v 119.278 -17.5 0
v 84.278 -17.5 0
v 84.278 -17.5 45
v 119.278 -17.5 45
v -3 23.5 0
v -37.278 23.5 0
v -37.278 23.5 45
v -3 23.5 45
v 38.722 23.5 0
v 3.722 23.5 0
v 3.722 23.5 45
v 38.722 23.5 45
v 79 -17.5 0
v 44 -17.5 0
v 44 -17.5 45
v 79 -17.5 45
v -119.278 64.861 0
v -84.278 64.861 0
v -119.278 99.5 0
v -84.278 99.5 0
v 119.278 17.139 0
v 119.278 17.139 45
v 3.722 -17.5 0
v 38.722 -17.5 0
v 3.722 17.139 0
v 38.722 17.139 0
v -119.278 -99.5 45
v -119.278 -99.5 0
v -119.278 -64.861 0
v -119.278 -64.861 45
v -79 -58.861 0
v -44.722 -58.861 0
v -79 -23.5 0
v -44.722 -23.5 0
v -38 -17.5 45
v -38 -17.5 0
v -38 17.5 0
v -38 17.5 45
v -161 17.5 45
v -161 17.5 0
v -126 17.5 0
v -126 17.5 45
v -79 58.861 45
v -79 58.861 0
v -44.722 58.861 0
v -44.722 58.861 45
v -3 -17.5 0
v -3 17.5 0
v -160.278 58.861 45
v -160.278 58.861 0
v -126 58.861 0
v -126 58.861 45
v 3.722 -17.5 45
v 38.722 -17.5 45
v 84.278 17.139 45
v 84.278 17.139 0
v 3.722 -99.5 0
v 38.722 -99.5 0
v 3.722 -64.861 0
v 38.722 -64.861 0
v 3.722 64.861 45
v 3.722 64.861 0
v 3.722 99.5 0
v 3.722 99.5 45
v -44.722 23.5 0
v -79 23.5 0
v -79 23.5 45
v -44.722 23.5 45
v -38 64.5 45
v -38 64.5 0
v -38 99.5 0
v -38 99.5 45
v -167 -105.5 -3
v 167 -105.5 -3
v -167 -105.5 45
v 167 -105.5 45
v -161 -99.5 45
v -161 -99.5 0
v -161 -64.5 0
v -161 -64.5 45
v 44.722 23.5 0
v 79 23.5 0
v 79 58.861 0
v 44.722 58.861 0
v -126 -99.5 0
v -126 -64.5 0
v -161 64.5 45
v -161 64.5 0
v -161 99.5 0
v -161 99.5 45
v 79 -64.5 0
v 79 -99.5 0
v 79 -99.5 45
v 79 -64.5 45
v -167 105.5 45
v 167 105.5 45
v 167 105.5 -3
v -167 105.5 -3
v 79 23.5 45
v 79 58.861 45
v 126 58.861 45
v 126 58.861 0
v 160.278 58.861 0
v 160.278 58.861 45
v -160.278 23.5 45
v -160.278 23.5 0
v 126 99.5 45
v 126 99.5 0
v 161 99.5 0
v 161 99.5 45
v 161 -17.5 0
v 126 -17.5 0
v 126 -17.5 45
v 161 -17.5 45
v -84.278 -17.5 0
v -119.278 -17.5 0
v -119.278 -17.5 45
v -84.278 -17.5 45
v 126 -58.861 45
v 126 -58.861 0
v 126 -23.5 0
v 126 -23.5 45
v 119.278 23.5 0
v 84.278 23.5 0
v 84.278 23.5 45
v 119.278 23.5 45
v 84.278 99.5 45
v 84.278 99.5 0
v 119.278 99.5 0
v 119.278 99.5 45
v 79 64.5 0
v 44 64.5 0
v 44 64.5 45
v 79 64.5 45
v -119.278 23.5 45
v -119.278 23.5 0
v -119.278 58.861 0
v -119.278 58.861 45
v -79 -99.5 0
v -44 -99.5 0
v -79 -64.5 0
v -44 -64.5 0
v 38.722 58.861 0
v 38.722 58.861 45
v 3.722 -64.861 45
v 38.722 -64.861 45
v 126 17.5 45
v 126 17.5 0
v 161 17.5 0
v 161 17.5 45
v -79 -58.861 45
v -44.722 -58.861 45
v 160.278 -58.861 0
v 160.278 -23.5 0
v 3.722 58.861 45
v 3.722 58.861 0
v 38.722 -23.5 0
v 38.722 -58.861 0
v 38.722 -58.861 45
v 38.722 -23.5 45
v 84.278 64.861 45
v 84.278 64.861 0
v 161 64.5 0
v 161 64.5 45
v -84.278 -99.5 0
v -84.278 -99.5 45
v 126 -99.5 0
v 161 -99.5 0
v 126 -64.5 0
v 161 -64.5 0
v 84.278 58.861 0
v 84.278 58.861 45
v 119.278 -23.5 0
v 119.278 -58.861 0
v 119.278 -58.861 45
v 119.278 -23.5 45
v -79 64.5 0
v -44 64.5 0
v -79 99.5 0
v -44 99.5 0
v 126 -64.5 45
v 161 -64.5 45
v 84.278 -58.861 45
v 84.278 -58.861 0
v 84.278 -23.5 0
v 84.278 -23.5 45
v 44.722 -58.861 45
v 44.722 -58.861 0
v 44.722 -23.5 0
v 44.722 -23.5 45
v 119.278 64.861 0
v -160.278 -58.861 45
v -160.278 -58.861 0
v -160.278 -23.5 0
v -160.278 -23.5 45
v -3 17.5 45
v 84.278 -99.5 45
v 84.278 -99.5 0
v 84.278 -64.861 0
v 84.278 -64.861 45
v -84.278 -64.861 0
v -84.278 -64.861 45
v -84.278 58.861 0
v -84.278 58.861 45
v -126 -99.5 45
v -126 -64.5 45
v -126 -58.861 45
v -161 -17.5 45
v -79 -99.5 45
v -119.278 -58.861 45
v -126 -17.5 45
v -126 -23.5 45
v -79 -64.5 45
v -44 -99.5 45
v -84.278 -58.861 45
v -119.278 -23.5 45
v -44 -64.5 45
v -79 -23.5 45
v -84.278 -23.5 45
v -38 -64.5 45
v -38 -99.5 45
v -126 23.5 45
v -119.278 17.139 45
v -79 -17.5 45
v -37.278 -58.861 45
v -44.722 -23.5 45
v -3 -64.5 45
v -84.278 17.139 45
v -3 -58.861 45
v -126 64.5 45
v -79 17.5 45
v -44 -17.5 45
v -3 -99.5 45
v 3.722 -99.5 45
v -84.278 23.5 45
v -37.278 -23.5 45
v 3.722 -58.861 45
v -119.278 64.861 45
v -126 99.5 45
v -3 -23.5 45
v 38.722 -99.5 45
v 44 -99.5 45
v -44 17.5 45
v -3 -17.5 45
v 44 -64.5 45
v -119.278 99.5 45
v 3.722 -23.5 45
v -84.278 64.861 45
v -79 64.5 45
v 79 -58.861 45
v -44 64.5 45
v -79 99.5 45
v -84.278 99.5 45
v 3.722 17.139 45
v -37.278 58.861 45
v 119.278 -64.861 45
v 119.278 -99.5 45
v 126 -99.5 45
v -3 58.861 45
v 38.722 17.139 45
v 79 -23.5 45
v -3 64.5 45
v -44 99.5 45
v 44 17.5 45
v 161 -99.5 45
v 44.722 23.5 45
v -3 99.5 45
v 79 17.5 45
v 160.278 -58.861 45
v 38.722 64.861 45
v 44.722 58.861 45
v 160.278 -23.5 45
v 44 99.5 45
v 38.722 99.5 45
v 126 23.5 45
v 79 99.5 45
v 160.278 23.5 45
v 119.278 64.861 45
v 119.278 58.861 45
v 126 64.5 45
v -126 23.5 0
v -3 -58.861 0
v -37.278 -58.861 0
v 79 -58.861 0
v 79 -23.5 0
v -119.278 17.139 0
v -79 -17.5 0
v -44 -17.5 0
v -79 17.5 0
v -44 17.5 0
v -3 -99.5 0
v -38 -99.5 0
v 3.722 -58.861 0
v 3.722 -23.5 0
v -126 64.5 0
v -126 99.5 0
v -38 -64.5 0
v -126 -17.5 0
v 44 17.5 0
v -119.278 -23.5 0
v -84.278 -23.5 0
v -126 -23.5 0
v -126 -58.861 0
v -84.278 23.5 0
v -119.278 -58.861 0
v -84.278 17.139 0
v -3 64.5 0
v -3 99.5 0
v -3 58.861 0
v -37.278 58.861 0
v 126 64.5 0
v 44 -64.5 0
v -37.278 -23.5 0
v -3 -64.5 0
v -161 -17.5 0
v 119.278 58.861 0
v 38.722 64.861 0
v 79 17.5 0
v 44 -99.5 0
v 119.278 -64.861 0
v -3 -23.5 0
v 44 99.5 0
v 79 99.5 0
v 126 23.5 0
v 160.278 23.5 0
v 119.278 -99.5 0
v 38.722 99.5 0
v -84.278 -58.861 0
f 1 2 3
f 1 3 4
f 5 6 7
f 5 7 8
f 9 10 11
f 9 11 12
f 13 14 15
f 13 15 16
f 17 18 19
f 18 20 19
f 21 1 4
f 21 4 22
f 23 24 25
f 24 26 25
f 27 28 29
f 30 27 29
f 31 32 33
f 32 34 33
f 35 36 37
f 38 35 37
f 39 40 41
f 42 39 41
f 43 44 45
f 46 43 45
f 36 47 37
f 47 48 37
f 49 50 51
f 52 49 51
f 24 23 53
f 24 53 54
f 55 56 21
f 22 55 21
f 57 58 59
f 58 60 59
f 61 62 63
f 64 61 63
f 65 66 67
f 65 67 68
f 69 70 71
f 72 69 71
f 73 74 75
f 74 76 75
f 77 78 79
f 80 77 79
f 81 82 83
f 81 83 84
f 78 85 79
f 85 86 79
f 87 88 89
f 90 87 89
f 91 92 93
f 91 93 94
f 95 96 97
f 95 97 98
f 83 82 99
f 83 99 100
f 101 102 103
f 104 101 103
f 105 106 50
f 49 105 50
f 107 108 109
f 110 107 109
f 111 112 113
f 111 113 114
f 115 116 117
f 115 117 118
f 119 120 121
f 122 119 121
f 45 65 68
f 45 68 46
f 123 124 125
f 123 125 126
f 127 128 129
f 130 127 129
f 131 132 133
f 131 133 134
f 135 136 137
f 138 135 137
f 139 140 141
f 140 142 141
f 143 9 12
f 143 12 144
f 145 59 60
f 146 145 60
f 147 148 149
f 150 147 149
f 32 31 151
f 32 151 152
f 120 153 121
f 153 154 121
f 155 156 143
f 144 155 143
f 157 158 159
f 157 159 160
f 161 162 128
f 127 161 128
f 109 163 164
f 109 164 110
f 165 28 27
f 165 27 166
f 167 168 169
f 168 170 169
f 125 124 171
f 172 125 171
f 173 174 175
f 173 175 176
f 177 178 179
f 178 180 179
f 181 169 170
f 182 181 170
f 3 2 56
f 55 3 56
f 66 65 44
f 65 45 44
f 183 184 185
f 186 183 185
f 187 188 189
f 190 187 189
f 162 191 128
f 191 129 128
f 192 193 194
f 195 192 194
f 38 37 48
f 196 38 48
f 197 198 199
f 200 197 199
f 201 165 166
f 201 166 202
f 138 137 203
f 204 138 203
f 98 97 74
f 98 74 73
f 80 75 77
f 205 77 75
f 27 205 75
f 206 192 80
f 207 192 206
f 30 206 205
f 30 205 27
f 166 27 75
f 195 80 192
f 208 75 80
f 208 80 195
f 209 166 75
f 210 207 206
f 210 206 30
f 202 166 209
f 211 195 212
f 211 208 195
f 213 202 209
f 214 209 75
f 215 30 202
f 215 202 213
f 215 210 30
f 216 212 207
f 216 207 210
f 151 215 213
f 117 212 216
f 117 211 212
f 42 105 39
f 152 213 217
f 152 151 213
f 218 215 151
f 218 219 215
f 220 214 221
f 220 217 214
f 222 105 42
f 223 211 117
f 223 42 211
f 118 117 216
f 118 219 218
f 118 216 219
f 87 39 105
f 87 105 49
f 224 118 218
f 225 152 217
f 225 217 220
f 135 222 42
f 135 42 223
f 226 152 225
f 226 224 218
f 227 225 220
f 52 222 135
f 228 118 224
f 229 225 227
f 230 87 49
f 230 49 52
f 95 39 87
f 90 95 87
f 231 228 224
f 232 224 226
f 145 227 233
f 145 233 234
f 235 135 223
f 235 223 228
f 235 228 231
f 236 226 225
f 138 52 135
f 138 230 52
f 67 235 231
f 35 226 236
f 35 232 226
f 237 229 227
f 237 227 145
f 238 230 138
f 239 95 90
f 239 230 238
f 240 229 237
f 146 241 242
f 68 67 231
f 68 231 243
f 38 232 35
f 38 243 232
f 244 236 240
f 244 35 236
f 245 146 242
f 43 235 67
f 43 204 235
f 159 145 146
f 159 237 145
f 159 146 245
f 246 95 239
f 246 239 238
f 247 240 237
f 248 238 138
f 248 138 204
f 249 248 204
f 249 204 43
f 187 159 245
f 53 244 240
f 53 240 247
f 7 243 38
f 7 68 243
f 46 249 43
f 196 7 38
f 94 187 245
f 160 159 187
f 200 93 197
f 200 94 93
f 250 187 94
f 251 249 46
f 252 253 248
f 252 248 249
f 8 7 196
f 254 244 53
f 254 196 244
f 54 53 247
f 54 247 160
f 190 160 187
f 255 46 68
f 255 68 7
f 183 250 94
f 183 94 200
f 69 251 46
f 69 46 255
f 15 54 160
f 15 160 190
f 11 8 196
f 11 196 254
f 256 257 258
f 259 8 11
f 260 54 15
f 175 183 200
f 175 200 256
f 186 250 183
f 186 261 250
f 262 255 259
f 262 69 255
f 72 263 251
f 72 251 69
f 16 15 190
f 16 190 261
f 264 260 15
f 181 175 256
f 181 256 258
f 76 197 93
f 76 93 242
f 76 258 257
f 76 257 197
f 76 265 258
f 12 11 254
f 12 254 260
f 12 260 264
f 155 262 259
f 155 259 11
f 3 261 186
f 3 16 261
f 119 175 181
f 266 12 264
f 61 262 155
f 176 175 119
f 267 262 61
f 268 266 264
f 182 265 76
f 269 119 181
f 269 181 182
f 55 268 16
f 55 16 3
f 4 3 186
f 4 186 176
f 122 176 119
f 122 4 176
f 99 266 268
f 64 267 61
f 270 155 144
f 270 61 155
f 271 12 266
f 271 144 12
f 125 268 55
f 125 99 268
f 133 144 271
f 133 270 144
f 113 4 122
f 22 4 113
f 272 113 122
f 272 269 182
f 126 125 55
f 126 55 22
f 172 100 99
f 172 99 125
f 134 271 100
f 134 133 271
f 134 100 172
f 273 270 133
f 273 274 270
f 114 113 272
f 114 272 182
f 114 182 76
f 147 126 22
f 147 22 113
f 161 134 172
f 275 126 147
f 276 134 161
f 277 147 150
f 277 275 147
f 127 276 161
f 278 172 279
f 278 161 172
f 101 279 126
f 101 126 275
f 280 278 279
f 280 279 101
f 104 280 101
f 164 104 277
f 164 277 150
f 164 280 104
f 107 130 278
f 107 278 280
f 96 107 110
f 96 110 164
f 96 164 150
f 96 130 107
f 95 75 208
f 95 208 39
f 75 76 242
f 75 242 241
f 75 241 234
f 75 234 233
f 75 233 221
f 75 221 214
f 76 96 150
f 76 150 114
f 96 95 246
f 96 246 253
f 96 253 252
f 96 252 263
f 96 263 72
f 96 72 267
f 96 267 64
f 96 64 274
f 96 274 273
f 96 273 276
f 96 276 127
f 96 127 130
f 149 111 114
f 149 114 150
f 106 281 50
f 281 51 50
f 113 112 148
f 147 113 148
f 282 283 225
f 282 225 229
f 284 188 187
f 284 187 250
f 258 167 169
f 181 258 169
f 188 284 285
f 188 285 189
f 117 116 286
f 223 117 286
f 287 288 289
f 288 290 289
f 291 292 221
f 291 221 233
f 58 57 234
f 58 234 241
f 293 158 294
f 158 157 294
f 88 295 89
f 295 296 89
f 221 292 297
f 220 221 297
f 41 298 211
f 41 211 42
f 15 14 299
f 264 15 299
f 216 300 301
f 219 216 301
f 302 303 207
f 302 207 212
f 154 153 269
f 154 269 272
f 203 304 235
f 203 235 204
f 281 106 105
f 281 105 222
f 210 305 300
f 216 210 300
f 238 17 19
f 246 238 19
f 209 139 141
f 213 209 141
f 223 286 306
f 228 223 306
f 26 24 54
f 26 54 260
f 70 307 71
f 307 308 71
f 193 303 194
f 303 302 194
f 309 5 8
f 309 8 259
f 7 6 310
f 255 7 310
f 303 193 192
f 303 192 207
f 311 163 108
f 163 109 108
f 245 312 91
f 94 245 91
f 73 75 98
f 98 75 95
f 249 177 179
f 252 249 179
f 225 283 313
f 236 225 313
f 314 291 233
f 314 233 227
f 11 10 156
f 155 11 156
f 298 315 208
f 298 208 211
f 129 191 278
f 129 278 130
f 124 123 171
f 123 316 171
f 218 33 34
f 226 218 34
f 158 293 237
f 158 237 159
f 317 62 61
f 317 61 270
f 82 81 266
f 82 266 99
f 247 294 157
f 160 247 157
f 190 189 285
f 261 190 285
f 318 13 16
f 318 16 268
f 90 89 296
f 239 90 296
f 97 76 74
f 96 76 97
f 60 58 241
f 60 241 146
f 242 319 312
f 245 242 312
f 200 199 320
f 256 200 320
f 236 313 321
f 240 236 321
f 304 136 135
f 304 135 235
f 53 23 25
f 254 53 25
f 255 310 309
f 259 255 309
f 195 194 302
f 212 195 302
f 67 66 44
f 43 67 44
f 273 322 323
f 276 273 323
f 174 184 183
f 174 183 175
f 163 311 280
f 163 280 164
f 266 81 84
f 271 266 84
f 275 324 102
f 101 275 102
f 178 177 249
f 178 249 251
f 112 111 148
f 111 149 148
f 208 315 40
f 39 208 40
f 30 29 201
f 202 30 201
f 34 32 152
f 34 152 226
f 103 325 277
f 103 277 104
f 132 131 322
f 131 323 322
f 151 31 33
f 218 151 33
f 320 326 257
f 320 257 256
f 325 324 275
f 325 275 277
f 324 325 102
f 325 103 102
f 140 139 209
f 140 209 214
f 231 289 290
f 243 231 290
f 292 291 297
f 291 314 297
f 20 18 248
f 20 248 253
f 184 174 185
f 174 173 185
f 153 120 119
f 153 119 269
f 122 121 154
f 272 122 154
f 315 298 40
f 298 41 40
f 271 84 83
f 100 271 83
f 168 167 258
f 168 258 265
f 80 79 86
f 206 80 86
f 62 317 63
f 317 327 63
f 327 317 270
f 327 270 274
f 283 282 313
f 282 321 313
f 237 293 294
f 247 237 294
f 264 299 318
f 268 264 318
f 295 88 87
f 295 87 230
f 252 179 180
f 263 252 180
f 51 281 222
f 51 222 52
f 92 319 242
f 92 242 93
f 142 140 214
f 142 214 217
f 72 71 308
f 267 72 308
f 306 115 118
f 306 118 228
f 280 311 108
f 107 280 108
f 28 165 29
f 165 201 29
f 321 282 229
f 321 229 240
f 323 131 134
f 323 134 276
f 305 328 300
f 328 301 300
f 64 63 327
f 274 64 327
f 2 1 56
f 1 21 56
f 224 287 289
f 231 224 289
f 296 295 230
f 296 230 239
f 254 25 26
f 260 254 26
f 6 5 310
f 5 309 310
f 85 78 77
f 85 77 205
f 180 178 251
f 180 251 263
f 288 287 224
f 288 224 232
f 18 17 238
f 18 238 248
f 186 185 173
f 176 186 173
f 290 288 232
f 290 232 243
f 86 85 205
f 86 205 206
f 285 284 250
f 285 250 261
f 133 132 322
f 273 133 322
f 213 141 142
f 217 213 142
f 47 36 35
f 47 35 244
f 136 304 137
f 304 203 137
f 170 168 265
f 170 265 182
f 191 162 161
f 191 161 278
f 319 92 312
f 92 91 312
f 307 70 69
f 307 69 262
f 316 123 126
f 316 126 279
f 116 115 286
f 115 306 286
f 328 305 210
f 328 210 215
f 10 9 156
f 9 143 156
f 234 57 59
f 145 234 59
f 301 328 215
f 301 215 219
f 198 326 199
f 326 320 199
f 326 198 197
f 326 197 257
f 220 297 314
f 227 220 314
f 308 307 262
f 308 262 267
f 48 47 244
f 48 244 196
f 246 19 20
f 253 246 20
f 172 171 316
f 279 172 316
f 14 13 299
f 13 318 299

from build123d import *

# Parameters (mm, degrees)
SKETCH1_W           = 334
SKETCH1_H           = 211
SKETCH1_W_2         = 34.277630703
SKETCH1_H_2         = 35.361184648
SKETCH1_W_3         = 35
SKETCH1_H_3         = 35
SKETCH1_H_4         = 34.638815352
BOSS_EXTRUDE1_DEPTH = 45
SKETCH2_W           = 334
SKETCH2_H           = 211
BOSS_EXTRUDE2_DEPTH = 3


with BuildPart() as part:
    # Sketch1 → Boss-Extrude1 (new body)
    with BuildSketch(Plane.XY):
        Rectangle(SKETCH1_W, SKETCH1_H)
        with Locations((143.138815351, 41.180592324)):
            Rectangle(SKETCH1_W_2, SKETCH1_H_2, mode=Mode.SUBTRACT)
        with Locations((143.5, 82)):
            Rectangle(SKETCH1_W_3, SKETCH1_H_3, mode=Mode.SUBTRACT)
        with Locations((61.5, 82)):
            Rectangle(SKETCH1_W_3, SKETCH1_H_3, mode=Mode.SUBTRACT)
        with Locations((61.861184649, 41.180592324)):
            Rectangle(SKETCH1_W_2, SKETCH1_H_2, mode=Mode.SUBTRACT)
        with Locations((101.777630703, 82.180592324)):
            Rectangle(SKETCH1_W_3, SKETCH1_H_4, mode=Mode.SUBTRACT)
        with Locations((101.777630703, 41.180592324)):
            Rectangle(SKETCH1_W_3, SKETCH1_H_2, mode=Mode.SUBTRACT)
        with Locations((143.138815351, -41.180592324)):
            Rectangle(SKETCH1_W_2, SKETCH1_H_2, mode=Mode.SUBTRACT)
        with Locations((101.777630703, -41.180592324)):
            Rectangle(SKETCH1_W_3, SKETCH1_H_2, mode=Mode.SUBTRACT)
        with Locations((61.861184649, -41.180592324)):
            Rectangle(SKETCH1_W_2, SKETCH1_H_2, mode=Mode.SUBTRACT)
        with Locations((61.5, -82)):
            Rectangle(SKETCH1_W_3, SKETCH1_H_3, mode=Mode.SUBTRACT)
        with Locations((101.777630703, -82.180592324)):
            Rectangle(SKETCH1_W_3, SKETCH1_H_4, mode=Mode.SUBTRACT)
        with Locations((143.5, -82)):
            Rectangle(SKETCH1_W_3, SKETCH1_H_3, mode=Mode.SUBTRACT)
        with Locations((-143.5, -82)):
            Rectangle(SKETCH1_W_3, SKETCH1_H_3, mode=Mode.SUBTRACT)
        with Locations((-101.777630703, -82.180592324)):
            Rectangle(SKETCH1_W_3, SKETCH1_H_4, mode=Mode.SUBTRACT)
        with Locations((-61.5, -82)):
            Rectangle(SKETCH1_W_3, SKETCH1_H_3, mode=Mode.SUBTRACT)
        with Locations((-61.861184649, -41.180592324)):
            Rectangle(SKETCH1_W_2, SKETCH1_H_2, mode=Mode.SUBTRACT)
        with Locations((-101.777630703, -41.180592324)):
            Rectangle(SKETCH1_W_3, SKETCH1_H_2, mode=Mode.SUBTRACT)
        with Locations((-143.138815351, -41.180592324)):
            Rectangle(SKETCH1_W_2, SKETCH1_H_2, mode=Mode.SUBTRACT)
        with Locations((-143.138815351, 41.180592324)):
            Rectangle(SKETCH1_W_2, SKETCH1_H_2, mode=Mode.SUBTRACT)
        with Locations((-101.777630703, 41.180592324)):
            Rectangle(SKETCH1_W_3, SKETCH1_H_2, mode=Mode.SUBTRACT)
        with Locations((-61.861184649, 41.180592324)):
            Rectangle(SKETCH1_W_2, SKETCH1_H_2, mode=Mode.SUBTRACT)
        with Locations((-61.5, 82)):
            Rectangle(SKETCH1_W_3, SKETCH1_H_3, mode=Mode.SUBTRACT)
        with Locations((-101.777630703, 82.180592324)):
            Rectangle(SKETCH1_W_3, SKETCH1_H_4, mode=Mode.SUBTRACT)
        with Locations((-143.5, 82)):
            Rectangle(SKETCH1_W_3, SKETCH1_H_3, mode=Mode.SUBTRACT)
        with Locations((61.5, 0)):
            Rectangle(SKETCH1_W_3, SKETCH1_H_3, mode=Mode.SUBTRACT)
        with Locations((101.777630703, -0.180592324)):
            Rectangle(SKETCH1_W_3, SKETCH1_H_4, mode=Mode.SUBTRACT)
        with Locations((143.5, 0)):
            Rectangle(SKETCH1_W_3, SKETCH1_H_3, mode=Mode.SUBTRACT)
        with Locations((-143.5, 0)):
            Rectangle(SKETCH1_W_3, SKETCH1_H_3, mode=Mode.SUBTRACT)
        with Locations((-101.777630703, -0.180592324)):
            Rectangle(SKETCH1_W_3, SKETCH1_H_4, mode=Mode.SUBTRACT)
        with Locations((-61.5, 0)):
            Rectangle(SKETCH1_W_3, SKETCH1_H_3, mode=Mode.SUBTRACT)
        with Locations((-20.5, 82)):
            Rectangle(SKETCH1_W_3, SKETCH1_H_3, mode=Mode.SUBTRACT)
        with Locations((-20.138815351, 41.180592324)):
            Rectangle(SKETCH1_W_2, SKETCH1_H_2, mode=Mode.SUBTRACT)
        with Locations((-20.5, 0)):
            Rectangle(SKETCH1_W_3, SKETCH1_H_3, mode=Mode.SUBTRACT)
        with Locations((-20.138815351, -41.180592324)):
            Rectangle(SKETCH1_W_2, SKETCH1_H_2, mode=Mode.SUBTRACT)
        with Locations((-20.5, -82)):
            Rectangle(SKETCH1_W_3, SKETCH1_H_3, mode=Mode.SUBTRACT)
        with Locations((21.222369297, -82.180592324)):
            Rectangle(SKETCH1_W_3, SKETCH1_H_4, mode=Mode.SUBTRACT)
        with Locations((21.222369297, -41.180592324)):
            Rectangle(SKETCH1_W_3, SKETCH1_H_2, mode=Mode.SUBTRACT)
        with Locations((21.222369297, -0.180592324)):
            Rectangle(SKETCH1_W_3, SKETCH1_H_4, mode=Mode.SUBTRACT)
        with Locations((21.222369297, 41.180592324)):
            Rectangle(SKETCH1_W_3, SKETCH1_H_2, mode=Mode.SUBTRACT)
        with Locations((21.222369297, 82.180592324)):
            Rectangle(SKETCH1_W_3, SKETCH1_H_4, mode=Mode.SUBTRACT)
    extrude(amount=BOSS_EXTRUDE1_DEPTH)

    # Sketch2 → Boss-Extrude2 (add)
    with BuildSketch(Plane(origin=(0, 0, 0), x_dir=(-1, 0, 0), z_dir=(0, 0, -1))):
        Rectangle(SKETCH2_W, SKETCH2_H)
    extrude(amount=BOSS_EXTRUDE2_DEPTH)


solid = part.part
